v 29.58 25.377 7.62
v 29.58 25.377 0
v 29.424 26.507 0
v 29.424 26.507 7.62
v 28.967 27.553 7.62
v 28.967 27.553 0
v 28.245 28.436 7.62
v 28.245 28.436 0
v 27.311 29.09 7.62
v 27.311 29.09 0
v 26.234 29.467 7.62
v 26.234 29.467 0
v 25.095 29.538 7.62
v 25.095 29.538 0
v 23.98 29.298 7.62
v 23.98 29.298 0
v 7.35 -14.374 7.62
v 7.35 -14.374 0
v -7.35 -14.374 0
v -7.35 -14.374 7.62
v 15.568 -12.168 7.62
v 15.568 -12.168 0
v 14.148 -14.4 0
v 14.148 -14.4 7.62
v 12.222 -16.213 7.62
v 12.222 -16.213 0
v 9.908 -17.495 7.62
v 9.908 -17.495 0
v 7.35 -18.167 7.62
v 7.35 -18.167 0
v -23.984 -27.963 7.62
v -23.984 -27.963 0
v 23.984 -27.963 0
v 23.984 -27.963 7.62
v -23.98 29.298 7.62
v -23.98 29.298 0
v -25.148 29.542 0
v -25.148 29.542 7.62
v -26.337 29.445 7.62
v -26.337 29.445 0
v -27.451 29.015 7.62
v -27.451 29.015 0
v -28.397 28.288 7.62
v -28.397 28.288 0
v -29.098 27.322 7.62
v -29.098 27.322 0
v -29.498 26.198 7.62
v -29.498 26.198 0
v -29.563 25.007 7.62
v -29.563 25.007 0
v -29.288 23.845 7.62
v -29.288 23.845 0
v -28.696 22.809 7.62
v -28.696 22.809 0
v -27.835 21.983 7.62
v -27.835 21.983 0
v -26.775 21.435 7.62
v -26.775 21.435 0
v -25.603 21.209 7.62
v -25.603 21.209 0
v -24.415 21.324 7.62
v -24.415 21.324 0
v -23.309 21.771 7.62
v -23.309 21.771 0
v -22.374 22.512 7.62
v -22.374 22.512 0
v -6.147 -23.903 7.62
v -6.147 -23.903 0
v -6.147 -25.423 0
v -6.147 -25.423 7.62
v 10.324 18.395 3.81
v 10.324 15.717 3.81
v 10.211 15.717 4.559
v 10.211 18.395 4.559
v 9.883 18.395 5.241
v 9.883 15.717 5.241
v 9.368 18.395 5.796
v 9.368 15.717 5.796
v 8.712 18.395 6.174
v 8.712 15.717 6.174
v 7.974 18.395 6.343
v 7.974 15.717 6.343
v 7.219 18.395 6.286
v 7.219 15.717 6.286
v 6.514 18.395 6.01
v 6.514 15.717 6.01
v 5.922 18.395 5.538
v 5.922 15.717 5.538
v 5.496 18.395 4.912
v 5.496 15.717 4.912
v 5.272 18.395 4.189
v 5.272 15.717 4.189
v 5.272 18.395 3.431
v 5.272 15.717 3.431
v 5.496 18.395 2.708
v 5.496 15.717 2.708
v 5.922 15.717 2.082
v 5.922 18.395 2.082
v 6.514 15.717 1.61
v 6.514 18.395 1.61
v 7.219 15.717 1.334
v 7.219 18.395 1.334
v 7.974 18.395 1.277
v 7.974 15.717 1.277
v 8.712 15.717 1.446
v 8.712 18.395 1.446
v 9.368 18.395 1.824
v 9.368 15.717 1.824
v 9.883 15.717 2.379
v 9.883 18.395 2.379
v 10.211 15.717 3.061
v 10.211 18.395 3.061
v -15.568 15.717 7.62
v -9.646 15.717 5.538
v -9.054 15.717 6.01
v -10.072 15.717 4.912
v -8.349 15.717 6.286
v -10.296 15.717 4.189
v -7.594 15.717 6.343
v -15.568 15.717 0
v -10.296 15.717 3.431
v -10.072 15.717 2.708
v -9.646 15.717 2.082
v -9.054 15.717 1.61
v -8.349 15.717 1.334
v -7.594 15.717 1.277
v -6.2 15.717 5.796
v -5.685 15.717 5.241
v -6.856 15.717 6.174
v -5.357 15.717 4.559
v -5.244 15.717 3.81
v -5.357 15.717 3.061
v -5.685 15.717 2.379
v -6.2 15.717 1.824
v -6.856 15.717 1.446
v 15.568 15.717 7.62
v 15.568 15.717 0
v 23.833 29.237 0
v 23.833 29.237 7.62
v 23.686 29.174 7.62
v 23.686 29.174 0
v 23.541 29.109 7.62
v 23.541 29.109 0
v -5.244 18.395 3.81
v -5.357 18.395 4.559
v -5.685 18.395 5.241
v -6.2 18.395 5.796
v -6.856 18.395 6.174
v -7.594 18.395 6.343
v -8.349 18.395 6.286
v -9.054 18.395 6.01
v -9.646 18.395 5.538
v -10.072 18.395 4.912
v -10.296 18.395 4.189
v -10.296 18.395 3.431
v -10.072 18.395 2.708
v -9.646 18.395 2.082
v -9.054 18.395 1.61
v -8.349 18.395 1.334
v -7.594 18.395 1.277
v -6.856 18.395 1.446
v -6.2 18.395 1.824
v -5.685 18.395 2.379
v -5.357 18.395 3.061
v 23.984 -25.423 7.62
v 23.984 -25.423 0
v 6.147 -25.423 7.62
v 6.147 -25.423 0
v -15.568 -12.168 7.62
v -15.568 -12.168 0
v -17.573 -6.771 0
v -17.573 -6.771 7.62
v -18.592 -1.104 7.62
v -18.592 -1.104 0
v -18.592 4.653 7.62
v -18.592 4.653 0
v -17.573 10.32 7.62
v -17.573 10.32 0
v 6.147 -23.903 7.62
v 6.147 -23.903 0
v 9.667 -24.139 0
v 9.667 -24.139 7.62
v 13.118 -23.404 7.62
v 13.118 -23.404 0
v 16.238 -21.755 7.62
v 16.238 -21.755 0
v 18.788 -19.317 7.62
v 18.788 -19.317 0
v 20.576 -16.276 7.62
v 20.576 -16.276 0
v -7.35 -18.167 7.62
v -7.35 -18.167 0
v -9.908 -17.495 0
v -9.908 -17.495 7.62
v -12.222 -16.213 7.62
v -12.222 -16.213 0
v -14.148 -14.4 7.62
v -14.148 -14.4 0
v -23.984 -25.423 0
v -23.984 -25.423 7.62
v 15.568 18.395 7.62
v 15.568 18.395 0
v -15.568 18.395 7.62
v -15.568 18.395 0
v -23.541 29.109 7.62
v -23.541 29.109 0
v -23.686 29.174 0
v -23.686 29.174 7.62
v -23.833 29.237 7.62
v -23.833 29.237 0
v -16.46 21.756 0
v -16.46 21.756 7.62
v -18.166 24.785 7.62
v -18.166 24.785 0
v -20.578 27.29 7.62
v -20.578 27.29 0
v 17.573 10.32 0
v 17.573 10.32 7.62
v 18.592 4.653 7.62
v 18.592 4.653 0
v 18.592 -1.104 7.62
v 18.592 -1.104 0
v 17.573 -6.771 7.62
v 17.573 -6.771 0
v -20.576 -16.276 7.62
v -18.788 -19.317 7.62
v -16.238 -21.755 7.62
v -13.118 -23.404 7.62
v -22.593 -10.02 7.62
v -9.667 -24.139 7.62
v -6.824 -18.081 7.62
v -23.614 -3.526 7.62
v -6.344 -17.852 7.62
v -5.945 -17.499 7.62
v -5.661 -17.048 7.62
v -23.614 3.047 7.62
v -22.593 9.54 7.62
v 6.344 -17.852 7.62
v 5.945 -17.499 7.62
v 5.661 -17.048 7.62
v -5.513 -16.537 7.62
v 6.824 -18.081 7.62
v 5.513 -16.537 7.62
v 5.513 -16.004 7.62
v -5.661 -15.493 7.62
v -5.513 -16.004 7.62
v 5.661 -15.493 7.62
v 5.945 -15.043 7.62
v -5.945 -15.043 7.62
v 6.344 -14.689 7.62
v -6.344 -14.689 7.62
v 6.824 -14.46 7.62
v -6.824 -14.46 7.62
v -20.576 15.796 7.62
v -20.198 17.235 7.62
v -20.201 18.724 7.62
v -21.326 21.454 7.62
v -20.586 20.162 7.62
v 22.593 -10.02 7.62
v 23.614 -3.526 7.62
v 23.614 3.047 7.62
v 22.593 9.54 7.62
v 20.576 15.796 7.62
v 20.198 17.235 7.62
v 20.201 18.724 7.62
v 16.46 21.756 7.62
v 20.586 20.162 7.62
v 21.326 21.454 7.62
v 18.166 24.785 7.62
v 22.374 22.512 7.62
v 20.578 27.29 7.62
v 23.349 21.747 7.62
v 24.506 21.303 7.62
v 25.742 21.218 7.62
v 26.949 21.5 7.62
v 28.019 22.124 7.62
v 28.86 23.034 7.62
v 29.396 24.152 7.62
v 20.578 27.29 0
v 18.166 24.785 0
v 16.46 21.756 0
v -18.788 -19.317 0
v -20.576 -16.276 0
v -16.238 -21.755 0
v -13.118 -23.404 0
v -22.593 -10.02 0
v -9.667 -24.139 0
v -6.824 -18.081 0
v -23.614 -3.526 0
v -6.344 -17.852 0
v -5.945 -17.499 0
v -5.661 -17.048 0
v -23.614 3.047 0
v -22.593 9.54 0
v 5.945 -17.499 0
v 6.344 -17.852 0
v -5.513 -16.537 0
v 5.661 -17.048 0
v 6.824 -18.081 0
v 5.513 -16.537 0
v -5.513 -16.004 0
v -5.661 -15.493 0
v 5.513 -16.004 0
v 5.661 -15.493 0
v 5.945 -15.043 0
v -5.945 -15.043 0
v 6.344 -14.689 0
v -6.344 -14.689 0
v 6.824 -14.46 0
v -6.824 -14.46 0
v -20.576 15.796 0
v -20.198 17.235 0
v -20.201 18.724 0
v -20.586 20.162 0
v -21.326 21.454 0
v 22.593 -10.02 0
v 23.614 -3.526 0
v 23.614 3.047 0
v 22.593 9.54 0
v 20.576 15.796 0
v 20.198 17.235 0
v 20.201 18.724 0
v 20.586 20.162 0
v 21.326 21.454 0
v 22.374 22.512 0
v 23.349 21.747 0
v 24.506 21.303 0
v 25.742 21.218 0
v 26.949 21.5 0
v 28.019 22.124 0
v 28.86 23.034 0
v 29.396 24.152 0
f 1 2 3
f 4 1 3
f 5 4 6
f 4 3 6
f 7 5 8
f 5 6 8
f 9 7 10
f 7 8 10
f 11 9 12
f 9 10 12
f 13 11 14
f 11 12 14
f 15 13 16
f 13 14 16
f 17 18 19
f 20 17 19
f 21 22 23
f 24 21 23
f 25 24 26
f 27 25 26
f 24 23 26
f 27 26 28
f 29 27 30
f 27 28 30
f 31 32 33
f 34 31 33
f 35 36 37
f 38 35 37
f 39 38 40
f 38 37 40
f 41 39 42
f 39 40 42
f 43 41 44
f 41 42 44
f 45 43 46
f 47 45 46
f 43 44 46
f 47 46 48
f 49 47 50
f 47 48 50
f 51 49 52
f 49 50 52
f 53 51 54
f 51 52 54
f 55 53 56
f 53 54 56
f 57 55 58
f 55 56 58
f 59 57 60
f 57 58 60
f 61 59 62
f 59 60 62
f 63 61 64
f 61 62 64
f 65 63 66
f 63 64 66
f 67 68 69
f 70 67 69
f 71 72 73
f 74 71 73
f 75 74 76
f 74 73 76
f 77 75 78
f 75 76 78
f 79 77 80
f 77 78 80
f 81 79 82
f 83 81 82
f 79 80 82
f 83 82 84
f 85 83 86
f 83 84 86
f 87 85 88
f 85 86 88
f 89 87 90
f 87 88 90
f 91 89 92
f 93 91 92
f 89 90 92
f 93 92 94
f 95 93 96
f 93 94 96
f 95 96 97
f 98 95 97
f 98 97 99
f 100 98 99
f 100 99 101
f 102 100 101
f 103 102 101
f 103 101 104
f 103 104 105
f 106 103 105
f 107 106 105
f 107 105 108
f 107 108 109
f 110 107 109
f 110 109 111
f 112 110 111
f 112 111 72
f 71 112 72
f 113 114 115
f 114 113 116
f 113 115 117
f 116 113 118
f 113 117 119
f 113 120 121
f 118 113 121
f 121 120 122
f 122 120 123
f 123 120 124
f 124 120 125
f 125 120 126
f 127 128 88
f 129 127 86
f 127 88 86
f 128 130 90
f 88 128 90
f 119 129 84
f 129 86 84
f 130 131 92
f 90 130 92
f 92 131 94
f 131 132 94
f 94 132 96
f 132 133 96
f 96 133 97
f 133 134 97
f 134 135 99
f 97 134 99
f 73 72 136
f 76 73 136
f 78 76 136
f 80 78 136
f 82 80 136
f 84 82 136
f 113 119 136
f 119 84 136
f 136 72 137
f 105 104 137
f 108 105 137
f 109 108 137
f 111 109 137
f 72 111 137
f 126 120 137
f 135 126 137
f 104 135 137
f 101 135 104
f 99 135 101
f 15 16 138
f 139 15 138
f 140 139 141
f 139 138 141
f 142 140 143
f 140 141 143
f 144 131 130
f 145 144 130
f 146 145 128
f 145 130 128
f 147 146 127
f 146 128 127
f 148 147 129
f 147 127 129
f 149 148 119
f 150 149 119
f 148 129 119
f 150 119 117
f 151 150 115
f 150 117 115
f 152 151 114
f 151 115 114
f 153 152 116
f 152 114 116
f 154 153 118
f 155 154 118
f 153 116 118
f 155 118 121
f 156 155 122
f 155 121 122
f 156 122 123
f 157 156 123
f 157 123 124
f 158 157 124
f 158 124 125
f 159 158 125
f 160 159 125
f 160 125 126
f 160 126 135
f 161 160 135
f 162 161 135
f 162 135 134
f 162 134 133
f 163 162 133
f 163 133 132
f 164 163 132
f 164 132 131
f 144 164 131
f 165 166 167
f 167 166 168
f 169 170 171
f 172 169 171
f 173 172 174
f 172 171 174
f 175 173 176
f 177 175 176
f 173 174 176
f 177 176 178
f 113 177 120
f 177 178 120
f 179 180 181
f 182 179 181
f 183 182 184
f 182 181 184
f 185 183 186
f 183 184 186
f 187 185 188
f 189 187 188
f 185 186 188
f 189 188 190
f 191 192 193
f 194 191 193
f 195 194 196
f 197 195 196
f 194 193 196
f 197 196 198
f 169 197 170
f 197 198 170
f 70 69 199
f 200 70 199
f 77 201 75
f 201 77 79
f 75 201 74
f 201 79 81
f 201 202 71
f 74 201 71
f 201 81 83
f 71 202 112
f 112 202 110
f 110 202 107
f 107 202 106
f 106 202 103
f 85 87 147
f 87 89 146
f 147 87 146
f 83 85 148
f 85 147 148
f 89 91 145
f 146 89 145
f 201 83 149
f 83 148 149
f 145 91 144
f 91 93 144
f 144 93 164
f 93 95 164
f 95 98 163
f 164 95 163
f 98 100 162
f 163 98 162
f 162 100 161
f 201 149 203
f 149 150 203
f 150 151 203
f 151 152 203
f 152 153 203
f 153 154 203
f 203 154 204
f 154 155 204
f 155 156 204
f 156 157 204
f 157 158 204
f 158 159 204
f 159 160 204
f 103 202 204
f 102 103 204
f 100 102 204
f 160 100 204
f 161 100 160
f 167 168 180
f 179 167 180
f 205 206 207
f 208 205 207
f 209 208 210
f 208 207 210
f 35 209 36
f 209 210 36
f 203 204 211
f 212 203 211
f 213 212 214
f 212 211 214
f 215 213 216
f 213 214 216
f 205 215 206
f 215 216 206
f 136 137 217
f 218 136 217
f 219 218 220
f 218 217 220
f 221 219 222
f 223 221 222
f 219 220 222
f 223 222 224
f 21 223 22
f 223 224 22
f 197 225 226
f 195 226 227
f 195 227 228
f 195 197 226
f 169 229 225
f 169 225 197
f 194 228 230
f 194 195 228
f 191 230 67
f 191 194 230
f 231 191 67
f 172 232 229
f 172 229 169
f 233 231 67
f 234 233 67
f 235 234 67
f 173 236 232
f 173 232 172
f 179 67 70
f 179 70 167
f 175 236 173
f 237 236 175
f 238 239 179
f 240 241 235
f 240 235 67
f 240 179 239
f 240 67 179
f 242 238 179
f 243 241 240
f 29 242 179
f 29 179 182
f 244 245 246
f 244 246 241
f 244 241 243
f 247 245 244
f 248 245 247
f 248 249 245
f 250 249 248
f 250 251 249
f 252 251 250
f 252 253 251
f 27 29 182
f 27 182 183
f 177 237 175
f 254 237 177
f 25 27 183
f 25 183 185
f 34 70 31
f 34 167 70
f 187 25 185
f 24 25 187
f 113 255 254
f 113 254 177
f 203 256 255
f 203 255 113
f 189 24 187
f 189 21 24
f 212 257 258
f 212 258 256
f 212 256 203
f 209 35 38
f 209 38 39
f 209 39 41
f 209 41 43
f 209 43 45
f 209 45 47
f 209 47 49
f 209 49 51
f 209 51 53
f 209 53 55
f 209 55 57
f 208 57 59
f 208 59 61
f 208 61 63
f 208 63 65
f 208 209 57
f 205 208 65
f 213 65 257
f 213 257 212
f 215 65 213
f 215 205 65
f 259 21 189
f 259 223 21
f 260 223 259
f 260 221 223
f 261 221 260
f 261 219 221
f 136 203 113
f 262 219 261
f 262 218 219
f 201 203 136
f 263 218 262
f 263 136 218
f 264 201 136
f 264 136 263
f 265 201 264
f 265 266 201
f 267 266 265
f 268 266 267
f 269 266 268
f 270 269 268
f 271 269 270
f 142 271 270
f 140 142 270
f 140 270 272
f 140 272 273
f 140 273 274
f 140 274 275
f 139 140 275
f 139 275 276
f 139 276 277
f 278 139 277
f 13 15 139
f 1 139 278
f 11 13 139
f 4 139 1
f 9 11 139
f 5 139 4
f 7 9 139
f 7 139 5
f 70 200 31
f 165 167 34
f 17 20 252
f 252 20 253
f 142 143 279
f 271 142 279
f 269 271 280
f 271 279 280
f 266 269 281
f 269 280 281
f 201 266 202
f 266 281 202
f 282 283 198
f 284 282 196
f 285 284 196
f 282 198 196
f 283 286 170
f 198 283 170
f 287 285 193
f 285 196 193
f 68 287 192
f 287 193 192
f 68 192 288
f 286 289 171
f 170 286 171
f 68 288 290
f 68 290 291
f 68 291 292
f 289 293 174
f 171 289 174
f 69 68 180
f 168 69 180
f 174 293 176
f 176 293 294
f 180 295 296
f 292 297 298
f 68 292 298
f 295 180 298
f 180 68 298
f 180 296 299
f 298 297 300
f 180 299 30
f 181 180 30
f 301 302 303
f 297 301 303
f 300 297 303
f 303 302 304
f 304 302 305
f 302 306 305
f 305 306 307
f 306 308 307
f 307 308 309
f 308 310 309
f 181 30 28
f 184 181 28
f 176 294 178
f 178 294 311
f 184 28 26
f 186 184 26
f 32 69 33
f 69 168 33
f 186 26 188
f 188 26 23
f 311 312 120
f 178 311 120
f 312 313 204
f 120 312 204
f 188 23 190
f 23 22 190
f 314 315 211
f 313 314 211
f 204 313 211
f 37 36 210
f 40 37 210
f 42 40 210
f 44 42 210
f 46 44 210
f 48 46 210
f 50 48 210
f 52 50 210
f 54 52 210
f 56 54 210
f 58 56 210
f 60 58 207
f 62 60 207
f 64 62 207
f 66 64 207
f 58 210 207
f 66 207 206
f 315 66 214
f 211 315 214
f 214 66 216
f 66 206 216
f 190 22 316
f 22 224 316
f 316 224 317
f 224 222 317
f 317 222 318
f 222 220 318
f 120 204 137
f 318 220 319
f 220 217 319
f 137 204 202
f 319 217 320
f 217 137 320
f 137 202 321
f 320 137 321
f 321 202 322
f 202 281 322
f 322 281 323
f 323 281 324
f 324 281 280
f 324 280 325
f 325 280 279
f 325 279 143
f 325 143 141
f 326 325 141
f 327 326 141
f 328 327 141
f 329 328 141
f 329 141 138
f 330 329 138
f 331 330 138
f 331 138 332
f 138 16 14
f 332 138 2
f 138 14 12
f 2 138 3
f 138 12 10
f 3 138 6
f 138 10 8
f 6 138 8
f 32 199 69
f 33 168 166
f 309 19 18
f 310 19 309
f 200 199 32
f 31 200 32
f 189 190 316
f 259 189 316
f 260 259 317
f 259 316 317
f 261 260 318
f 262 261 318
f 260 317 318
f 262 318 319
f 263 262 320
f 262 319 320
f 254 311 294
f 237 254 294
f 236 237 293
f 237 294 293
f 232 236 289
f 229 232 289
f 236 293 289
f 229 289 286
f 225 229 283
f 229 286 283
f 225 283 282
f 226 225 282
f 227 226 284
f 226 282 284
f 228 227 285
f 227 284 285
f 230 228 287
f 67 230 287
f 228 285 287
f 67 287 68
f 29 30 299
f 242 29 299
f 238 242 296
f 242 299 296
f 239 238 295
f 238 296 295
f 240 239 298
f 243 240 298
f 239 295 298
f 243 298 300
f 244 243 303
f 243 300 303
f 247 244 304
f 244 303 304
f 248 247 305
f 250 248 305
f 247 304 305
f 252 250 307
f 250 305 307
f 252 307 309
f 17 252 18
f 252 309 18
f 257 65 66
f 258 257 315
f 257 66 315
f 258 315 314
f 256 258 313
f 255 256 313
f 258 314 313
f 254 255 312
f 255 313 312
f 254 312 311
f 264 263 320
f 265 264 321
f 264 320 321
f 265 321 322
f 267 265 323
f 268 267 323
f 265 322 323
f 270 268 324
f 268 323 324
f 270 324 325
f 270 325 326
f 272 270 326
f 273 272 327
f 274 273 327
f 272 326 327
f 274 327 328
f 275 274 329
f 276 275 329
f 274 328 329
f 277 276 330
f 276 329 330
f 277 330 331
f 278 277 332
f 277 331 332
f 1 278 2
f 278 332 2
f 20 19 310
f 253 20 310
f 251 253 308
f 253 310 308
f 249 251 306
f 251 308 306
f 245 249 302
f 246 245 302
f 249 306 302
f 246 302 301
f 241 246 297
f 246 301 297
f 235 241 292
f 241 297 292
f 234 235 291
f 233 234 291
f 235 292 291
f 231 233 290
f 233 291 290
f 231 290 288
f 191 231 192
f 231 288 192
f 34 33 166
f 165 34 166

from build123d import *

# Parameters (mm, degrees)
F1_DEPTH = 7.62
F3_D     = 5.08
F3_DEPTH = 12.7
F4_D     = 5.08
F4_DEPTH = 12.7


with BuildPart() as f1:
    # F0 (on Top) → F1 (new body)
    with BuildSketch(Plane.XY):
        with BuildLine():
            Line((15.568078, 18.394932), (0, 18.394932))
            Line((0, 18.394932), (-15.568078, 18.394932))
            ThreePointArc((-15.568078, 18.394932), (-18.165729, 24.785284), (-23.540653, 29.109008))
            ThreePointArc((-23.540653, 29.109008), (-21.857535, 27.570607), (-21.234469, 25.377127))
            ThreePointArc((-21.234469, 25.377127), (-21.529728, 23.83544), (-22.373719, 22.511939))
            ThreePointArc((-22.373719, 22.511939), (-20.346426, 19.455849), (-20.576485, 15.795702))
            ThreePointArc((-20.576485, 15.795702), (-23.7418, -0.239949), (-20.576485, -16.2756))
            ThreePointArc((-20.576485, -16.2756), (-14.735157, -22.687615), (-6.146982, -23.903467))
            Line((-6.146982, -23.903467), (-6.146982, -25.422873))
            Line((-6.146982, -25.422873), (-23.984324, -25.422873))
            Line((-23.984324, -25.422873), (-23.984324, -27.962873))
            Line((-23.984324, -27.962873), (0, -27.962873))
            Line((0, -27.962873), (23.984324, -27.962873))
            Line((23.984324, -27.962873), (23.984324, -25.422873))
            Line((23.984324, -25.422873), (6.146982, -25.422873))
            Line((6.146982, -25.422873), (6.146982, -23.903467))
            ThreePointArc((6.146982, -23.903467), (14.735157, -22.687615), (20.576485, -16.2756))
            ThreePointArc((20.576485, -16.2756), (23.7418, -0.239949), (20.576485, 15.795702))
            ThreePointArc((20.576485, 15.795702), (20.346426, 19.455849), (22.373719, 22.511939))
            ThreePointArc((22.373719, 22.511939), (21.298254, 26.103916), (23.540653, 29.109008))
            ThreePointArc((23.540653, 29.109008), (18.165729, 24.785284), (15.568078, 18.394932))
        make_face()
        with BuildLine():
            Line((-15.568078, 15.716709), (0, 15.716709))
            Line((0, 15.716709), (15.568078, 15.716709))
            ThreePointArc((15.568078, 15.716709), (18.720393, 1.774382), (15.568078, -12.167946))
            ThreePointArc((15.568078, -12.167946), (12.222243, -16.213262), (7.349744, -18.16722))
            ThreePointArc((7.349744, -18.16722), (5.494258, -16.270557), (7.349744, -14.373895))
            Line((7.349744, -14.373895), (0, -14.373895))
            Line((0, -14.373895), (-7.349744, -14.373895))
            ThreePointArc((-7.349744, -14.373895), (-5.494258, -16.270557), (-7.349744, -18.16722))
            ThreePointArc((-7.349744, -18.16722), (-12.222243, -16.213262), (-15.568078, -12.167946))
            ThreePointArc((-15.568078, -12.167946), (-18.720393, 1.774382), (-15.568078, 15.716709))
        make_face(mode=Mode.SUBTRACT)
        with BuildLine():
            ThreePointArc((23.979965, 29.29807), (23.759487, 29.20545), (23.540653, 29.109008))
            ThreePointArc((23.540653, 29.109008), (21.298254, 26.103916), (22.373719, 22.511939))
            ThreePointArc((22.373719, 22.511939), (26.948726, 21.499817), (29.579608, 25.377127))
            ThreePointArc((29.579608, 25.377127), (27.800339, 28.795087), (23.979965, 29.29807))
        make_face()
        with BuildLine():
            ThreePointArc((-21.234469, 25.377127), (-21.857535, 27.570607), (-23.540653, 29.109008))
            ThreePointArc((-23.540653, 29.109008), (-23.759487, 29.20545), (-23.979965, 29.29807))
            ThreePointArc((-23.979965, 29.29807), (-29.467417, 24.416054), (-22.373719, 22.511939))
            ThreePointArc((-22.373719, 22.511939), (-21.529728, 23.83544), (-21.234469, 25.377127))
        make_face()
    extrude(amount=F1_DEPTH)

    # F3
    with Locations(Plane(origin=(0, 18.394932, 0), x_dir=(-1, 0, 0), z_dir=(0, 1, 0))):
        with Locations((7.784039, 3.81)):
            Hole(F3_D / 2, depth=F3_DEPTH)

    # F4
    with Locations(Plane(origin=(0, 18.394932, 0), x_dir=(-1, 0, 0), z_dir=(0, 1, 0))):
        with Locations((-7.784039, 3.81)):
            Hole(F4_D / 2, depth=F4_DEPTH)


solid = f1.part
